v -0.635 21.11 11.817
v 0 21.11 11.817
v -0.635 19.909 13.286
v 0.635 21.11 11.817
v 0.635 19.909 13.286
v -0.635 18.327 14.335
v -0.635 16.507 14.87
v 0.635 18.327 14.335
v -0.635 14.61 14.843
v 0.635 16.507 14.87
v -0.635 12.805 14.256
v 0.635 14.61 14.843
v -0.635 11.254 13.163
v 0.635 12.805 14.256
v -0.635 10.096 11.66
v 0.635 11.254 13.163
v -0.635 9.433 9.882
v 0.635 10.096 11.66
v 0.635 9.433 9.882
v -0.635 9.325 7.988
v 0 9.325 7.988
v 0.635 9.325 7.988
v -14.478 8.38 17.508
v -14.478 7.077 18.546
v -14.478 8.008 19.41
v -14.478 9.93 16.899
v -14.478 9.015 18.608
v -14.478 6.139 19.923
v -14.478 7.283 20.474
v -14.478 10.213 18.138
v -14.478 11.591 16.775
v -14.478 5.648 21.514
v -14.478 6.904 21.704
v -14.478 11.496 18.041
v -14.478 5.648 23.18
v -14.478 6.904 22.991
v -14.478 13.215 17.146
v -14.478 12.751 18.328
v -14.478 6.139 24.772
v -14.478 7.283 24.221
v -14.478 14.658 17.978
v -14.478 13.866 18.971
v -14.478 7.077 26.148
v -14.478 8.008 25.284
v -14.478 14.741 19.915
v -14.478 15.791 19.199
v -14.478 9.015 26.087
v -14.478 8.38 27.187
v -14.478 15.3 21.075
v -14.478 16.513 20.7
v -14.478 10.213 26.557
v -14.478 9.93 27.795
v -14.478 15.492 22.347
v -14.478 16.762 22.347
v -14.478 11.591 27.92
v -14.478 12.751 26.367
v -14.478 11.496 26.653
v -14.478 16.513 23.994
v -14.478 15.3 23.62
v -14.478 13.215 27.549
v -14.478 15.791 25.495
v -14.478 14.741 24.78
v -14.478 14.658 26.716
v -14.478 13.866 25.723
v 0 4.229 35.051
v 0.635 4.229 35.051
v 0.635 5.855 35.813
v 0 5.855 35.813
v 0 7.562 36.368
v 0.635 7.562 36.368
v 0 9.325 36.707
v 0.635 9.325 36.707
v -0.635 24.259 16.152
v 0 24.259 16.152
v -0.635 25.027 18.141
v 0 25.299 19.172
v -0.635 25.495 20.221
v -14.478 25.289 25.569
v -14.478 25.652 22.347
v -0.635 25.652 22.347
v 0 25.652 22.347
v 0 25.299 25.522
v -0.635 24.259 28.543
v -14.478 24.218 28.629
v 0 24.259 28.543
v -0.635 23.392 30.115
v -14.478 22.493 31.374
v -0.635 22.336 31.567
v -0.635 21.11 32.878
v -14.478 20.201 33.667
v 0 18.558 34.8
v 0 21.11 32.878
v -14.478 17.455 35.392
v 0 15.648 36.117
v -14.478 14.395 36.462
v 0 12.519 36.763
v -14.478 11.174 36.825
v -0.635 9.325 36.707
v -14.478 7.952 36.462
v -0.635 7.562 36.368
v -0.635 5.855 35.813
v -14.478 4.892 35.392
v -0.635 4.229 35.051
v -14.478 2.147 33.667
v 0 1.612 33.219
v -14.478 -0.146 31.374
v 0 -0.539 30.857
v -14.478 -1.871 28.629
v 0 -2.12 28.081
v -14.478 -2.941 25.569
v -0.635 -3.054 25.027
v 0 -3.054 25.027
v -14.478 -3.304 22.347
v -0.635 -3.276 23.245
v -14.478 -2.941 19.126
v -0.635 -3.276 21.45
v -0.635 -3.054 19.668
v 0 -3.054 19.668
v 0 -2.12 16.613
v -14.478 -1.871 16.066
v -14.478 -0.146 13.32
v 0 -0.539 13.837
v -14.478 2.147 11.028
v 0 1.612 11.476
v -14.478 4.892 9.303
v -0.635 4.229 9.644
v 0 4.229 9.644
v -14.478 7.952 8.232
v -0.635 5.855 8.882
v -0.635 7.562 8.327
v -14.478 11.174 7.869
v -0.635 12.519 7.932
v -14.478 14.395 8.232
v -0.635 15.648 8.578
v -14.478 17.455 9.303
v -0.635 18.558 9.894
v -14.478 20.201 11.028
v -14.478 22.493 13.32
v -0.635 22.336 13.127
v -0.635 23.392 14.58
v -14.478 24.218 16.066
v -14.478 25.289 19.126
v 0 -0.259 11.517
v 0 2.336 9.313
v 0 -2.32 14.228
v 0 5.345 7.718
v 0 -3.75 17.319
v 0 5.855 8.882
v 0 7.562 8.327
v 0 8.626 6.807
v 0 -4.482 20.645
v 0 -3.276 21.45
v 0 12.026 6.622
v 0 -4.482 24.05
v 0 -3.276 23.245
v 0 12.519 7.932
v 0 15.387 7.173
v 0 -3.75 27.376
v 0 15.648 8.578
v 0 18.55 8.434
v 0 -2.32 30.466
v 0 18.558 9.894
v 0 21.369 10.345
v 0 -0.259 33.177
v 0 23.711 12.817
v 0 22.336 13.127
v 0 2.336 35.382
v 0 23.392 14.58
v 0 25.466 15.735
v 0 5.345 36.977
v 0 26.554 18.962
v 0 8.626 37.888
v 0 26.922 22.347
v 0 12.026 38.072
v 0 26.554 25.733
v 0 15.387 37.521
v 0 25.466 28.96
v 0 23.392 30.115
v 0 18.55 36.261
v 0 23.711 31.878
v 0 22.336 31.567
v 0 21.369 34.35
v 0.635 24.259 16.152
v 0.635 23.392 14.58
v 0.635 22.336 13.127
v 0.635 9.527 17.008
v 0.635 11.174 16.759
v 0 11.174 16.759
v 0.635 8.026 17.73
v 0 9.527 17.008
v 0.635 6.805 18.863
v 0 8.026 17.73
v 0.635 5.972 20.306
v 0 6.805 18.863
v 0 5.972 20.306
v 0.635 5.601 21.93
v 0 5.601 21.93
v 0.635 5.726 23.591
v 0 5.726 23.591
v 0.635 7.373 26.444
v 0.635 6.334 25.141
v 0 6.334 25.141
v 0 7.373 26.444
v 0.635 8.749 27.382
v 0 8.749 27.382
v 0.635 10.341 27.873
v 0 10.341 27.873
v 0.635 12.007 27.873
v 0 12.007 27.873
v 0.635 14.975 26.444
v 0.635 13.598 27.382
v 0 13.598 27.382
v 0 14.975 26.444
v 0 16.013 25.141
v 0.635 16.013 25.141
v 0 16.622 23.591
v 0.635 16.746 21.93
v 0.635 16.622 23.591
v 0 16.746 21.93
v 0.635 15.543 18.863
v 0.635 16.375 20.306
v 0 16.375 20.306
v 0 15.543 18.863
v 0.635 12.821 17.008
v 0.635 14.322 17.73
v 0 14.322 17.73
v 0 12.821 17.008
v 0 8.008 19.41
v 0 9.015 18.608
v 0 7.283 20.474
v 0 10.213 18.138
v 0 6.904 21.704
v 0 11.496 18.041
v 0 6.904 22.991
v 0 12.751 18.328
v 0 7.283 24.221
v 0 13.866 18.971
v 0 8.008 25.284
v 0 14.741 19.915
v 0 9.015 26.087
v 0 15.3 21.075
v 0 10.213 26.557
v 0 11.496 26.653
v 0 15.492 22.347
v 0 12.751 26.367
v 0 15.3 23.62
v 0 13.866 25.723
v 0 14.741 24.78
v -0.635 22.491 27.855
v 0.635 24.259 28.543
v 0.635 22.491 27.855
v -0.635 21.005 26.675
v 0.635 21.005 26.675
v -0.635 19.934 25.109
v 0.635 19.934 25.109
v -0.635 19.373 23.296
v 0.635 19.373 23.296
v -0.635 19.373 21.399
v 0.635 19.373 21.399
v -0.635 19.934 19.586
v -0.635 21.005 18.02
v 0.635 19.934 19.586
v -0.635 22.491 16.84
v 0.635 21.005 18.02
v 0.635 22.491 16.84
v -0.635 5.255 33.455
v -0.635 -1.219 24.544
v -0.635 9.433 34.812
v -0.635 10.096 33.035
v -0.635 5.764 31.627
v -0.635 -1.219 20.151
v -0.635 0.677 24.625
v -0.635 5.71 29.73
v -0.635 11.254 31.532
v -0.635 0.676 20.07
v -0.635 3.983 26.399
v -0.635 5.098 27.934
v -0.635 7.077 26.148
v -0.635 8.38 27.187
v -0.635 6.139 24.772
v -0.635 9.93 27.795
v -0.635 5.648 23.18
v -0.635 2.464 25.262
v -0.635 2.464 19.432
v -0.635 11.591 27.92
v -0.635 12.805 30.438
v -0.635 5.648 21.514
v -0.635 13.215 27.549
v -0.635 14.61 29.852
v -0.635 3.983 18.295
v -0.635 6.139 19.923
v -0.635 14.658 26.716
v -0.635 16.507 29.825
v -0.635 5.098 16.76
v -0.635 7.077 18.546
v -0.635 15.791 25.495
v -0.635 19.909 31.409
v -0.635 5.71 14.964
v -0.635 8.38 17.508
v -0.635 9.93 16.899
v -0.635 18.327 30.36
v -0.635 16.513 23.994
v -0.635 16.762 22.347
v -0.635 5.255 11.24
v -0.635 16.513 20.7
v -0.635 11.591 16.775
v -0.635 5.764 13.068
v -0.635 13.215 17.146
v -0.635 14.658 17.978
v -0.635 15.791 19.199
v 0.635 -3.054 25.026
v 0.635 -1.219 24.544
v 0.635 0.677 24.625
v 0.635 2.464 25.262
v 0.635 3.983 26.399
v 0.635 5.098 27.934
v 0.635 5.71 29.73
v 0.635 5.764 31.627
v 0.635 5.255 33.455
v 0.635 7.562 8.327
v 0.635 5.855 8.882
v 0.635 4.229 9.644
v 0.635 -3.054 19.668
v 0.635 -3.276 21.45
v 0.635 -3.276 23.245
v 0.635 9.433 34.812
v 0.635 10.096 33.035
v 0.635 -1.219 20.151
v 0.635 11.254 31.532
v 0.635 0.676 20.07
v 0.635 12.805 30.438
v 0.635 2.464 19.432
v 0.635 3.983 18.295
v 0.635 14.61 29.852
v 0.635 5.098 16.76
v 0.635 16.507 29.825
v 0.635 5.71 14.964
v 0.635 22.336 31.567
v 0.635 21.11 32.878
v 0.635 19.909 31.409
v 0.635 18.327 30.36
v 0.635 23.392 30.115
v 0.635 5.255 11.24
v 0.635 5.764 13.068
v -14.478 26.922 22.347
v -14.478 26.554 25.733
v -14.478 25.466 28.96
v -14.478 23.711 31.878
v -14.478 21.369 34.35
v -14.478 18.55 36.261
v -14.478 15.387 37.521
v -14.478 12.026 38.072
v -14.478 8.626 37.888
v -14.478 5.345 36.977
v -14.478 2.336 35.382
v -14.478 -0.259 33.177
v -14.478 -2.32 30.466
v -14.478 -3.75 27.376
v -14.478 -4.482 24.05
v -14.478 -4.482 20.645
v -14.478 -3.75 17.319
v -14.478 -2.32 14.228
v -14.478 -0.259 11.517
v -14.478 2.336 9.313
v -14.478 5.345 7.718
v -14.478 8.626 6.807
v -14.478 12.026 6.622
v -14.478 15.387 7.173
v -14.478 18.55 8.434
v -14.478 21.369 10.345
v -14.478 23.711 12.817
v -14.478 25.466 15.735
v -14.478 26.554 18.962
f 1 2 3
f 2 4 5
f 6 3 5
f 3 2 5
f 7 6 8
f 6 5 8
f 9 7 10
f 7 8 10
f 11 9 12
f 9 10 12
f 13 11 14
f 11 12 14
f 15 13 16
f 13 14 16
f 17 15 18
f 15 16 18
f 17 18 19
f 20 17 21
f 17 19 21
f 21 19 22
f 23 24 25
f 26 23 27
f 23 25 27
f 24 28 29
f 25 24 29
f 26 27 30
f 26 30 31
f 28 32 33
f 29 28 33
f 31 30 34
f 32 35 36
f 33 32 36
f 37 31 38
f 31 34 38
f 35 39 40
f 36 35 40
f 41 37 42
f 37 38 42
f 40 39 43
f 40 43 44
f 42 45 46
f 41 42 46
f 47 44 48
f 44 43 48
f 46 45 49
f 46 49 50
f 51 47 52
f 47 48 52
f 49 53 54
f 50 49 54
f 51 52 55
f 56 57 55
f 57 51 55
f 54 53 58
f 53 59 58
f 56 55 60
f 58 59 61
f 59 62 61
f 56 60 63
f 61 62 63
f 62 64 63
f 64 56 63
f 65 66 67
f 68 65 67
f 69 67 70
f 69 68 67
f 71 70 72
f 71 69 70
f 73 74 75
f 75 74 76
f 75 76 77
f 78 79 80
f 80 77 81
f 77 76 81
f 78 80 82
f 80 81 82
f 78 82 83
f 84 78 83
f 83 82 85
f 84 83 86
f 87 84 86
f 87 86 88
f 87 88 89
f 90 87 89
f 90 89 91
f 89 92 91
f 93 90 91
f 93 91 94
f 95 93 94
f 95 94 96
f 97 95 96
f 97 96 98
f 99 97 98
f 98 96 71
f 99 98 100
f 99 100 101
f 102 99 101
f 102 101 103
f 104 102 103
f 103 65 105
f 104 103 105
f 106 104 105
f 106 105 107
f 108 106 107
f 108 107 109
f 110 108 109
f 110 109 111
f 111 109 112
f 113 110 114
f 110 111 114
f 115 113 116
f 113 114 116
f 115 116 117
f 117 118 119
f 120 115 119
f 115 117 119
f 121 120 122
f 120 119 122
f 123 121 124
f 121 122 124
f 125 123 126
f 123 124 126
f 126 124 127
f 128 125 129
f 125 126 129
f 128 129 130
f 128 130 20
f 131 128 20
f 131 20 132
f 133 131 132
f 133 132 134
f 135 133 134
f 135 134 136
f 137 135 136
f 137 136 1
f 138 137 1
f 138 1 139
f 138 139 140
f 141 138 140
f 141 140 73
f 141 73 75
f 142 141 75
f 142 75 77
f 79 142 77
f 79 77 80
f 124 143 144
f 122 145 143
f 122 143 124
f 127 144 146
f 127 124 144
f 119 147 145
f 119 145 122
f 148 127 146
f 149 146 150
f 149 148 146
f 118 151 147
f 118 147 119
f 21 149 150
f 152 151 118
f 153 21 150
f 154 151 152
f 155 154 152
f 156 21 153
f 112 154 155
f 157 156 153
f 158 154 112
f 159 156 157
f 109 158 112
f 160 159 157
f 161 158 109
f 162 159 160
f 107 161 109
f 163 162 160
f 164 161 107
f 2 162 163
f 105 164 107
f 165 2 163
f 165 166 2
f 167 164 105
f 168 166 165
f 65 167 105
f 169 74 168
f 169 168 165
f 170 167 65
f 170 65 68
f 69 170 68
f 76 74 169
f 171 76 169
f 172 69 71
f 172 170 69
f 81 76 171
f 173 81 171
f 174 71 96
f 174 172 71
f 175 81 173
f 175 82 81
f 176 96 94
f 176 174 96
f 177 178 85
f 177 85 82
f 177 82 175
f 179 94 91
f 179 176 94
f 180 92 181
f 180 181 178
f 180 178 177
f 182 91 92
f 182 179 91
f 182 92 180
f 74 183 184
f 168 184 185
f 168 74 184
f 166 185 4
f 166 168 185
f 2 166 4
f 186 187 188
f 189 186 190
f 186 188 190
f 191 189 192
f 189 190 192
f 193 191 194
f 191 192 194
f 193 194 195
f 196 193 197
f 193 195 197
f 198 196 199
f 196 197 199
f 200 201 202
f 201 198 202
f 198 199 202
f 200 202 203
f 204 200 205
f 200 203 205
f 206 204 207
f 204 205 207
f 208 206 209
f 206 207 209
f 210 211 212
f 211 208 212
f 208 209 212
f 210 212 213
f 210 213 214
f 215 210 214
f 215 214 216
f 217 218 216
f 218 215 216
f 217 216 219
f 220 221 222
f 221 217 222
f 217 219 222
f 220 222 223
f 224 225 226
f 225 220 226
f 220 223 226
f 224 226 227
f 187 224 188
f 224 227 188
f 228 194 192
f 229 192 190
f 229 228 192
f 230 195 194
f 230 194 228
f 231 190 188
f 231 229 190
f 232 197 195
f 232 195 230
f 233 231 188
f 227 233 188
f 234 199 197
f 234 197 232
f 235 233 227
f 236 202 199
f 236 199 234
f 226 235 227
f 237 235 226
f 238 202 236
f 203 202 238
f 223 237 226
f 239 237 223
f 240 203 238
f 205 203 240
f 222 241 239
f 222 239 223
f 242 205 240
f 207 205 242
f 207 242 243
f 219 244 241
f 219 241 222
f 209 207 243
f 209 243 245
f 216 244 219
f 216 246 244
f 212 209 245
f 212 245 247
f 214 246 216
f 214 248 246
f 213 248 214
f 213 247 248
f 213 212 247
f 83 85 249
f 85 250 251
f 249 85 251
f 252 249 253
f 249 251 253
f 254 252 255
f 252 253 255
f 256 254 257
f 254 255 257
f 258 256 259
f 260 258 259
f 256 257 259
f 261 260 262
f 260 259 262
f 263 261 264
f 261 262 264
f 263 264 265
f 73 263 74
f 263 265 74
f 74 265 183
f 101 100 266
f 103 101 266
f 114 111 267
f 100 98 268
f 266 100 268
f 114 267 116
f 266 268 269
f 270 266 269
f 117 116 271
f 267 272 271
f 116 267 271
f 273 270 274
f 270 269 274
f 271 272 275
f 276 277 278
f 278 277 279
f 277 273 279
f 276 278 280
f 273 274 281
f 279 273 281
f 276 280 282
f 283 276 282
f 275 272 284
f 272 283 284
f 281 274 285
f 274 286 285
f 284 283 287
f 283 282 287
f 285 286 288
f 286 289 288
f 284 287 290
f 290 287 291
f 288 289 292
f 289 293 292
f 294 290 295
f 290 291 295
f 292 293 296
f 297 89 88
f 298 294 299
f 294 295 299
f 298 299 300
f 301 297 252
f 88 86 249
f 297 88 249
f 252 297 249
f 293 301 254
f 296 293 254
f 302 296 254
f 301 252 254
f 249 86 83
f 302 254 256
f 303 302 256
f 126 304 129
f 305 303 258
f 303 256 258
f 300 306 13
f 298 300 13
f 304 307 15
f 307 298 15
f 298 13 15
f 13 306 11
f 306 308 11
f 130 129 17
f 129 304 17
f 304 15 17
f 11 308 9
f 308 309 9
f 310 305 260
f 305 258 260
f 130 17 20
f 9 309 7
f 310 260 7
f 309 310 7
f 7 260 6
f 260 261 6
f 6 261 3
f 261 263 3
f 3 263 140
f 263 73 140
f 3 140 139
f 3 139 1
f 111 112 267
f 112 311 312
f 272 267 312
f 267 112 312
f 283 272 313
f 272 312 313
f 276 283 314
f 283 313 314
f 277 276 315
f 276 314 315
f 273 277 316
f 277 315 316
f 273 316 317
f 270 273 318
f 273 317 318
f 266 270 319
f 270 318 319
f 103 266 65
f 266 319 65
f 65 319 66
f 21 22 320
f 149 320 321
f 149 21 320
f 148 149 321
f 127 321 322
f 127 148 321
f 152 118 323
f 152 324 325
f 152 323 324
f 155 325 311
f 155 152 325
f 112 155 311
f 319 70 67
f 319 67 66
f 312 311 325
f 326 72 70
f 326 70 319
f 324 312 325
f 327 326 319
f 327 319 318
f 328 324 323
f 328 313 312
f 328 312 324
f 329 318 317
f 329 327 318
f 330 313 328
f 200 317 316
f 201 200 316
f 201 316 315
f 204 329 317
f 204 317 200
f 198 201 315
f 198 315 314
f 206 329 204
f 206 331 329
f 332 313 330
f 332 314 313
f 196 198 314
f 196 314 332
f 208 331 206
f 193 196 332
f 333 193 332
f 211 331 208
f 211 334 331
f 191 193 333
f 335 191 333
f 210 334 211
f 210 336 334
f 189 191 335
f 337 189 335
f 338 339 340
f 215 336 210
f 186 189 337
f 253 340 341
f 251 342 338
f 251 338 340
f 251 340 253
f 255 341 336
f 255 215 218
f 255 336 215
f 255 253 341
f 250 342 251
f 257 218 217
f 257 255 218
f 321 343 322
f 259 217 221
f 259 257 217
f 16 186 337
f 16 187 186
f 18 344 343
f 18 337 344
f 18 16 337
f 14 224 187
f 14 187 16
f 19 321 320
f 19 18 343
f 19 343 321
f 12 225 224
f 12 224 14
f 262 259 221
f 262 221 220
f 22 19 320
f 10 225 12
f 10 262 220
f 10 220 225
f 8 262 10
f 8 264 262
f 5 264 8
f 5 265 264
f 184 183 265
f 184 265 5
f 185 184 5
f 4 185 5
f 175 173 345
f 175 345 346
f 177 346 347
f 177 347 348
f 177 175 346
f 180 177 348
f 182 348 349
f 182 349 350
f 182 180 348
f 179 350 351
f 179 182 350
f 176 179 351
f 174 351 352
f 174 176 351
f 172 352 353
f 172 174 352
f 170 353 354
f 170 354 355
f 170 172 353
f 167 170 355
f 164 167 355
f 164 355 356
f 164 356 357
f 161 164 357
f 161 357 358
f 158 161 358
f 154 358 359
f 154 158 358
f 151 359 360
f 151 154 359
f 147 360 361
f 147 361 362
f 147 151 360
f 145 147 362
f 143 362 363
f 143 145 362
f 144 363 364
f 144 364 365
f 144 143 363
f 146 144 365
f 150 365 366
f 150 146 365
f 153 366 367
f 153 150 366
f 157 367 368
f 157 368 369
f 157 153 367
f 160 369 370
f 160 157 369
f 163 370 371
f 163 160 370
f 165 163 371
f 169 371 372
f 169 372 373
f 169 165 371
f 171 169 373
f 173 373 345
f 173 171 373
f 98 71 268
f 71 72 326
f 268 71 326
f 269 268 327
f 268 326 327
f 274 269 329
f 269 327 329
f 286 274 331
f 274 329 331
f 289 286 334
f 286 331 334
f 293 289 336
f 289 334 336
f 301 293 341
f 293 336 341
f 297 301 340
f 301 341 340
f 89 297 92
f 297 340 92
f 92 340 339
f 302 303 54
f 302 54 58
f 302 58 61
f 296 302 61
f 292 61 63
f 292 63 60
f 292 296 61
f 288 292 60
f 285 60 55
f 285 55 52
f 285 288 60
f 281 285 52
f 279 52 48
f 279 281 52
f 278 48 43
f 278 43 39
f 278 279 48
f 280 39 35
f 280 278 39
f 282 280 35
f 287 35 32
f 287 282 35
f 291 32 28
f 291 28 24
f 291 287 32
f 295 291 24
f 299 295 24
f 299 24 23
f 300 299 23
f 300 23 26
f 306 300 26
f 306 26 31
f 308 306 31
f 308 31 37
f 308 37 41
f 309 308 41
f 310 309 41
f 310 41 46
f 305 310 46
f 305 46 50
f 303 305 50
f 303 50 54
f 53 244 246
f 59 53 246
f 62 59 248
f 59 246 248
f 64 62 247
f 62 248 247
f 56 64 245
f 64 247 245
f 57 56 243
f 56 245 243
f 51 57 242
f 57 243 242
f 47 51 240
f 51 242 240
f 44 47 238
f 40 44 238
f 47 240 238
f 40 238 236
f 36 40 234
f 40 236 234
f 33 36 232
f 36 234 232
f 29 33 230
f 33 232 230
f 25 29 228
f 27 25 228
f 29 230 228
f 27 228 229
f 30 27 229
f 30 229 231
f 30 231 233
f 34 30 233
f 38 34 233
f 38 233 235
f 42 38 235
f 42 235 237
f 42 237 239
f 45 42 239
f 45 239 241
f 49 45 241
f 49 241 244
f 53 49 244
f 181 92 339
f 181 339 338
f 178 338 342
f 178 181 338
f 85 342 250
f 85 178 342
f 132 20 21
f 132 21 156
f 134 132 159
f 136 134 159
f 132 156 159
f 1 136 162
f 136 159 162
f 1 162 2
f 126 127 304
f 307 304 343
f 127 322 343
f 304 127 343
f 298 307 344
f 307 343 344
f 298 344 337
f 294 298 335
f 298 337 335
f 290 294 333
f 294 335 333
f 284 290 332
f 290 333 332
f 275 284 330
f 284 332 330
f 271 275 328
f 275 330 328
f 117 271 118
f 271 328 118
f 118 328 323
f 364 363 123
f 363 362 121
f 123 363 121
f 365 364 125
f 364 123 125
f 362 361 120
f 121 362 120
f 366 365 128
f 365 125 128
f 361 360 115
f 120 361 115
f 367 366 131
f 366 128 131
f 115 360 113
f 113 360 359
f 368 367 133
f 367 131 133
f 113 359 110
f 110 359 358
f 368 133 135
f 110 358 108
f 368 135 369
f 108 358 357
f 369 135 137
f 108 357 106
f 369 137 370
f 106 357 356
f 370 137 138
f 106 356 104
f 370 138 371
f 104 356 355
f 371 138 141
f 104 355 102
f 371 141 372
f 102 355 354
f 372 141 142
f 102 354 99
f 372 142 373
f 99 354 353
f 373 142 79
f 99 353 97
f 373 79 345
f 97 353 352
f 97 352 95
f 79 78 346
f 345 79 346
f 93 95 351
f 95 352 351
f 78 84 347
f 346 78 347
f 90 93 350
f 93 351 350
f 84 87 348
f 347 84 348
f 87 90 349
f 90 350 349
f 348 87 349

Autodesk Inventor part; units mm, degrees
ref_plane "YZ Plane" through (0, 0, 0) normal (1, 0, 0) x (0, 1, 0)
ref_plane "XZ Plane" through (0, 0, 0) normal (0, 1, 0) x (-1, 0, 0)
ref_plane "XY Plane" through (0, 0, 0) normal (0, 0, 1) x (1, 0, 0)
sketch "Sketch1" plane through (0, 0, 0) normal (1, 0, 0) x (0, 1, 0)
  circle A0 centre (11.1737, 22.3473) radius 5.588
  circle A1 centre (11.1737, 22.3473) radius 4.318
  circle A2 centre (11.1737, 22.3473) radius 14.478
  circle A3 centre (11.1737, 22.3473) radius 15.748
  point P0 (0, 0)
  dimension "d0" = 11.176
  dimension "d1" = 1.27
  dimension "d2" = 1.27
  dimension "d3" = 8.89
extrude "Extrusion1" add sketch "Sketch1" against normal blind 14.478 contours A3
extrude "Extrusion2" add sketch "Sketch1" against normal blind 14.478 contours A0
sketch "Sketch2" plane through (0, 11.1737, 22.3473) normal (1, 0, 0) x (0, 0, -1)
  circle A0 centre (0, 0) radius 14.478 projected
  circle A1 centre (0, 0) radius 15.748 projected
  circle A2 centre (0, 0) radius 5.588 projected
  circle A3 centre (0, 0) radius 4.318 projected
  point P0 (22.3473, -11.1737)
extrude "Extrusion3" add sketch "Sketch2" along normal mid plane 1.27 contours A0
sketch "Sketch3" plane through (0.635, 11.1737, 22.3473) normal (1, 0, 0) x (0, 0, -1)
  circle A0 centre (0, 0) radius 14.478 projected
  arc A1 (-6.1954, 13.0855) -> (6.1954, 13.0855) centre (0, 14.478) ccw
  arc A2 (6.1954, 13.0855) -> (-6.1954, 13.0855) centre (0, 0) ccw
  arc A3 (-14.3595, -1.8486) -> (-10.5305, 9.9358) centre (-13.7694, 4.4739) ccw
  arc A4 (-10.5305, 9.9358) -> (-14.3595, -1.8486) centre (0, 0) ccw
  arc A5 (-2.6792, -14.2279) -> (-12.7036, -6.9448) centre (-8.51, -11.7129) ccw
  arc A6 (-12.7036, -6.9448) -> (-2.6792, -14.2279) centre (0, 0) ccw
  arc A7 (12.7036, -6.9448) -> (2.6792, -14.2279) centre (8.51, -11.7129) ccw
  arc A8 (2.6792, -14.2279) -> (12.7036, -6.9448) centre (0, 0) ccw
  arc A9 (10.5305, 9.9358) -> (14.3595, -1.8486) centre (13.7694, 4.4739) ccw
  arc A10 (14.3595, -1.8486) -> (10.5305, 9.9358) centre (0, 0) ccw
  point P0 (22.3473, -11.1737)
  dimension "d10" = 12.7
  dimension "d13" = 360
extrude "Extrusion4" cut sketch "Sketch3" against normal up to next contours A0 A9 | A1 A0 | A0 A7 | A3 A0 | A0 A5
properties part number "wheal"
